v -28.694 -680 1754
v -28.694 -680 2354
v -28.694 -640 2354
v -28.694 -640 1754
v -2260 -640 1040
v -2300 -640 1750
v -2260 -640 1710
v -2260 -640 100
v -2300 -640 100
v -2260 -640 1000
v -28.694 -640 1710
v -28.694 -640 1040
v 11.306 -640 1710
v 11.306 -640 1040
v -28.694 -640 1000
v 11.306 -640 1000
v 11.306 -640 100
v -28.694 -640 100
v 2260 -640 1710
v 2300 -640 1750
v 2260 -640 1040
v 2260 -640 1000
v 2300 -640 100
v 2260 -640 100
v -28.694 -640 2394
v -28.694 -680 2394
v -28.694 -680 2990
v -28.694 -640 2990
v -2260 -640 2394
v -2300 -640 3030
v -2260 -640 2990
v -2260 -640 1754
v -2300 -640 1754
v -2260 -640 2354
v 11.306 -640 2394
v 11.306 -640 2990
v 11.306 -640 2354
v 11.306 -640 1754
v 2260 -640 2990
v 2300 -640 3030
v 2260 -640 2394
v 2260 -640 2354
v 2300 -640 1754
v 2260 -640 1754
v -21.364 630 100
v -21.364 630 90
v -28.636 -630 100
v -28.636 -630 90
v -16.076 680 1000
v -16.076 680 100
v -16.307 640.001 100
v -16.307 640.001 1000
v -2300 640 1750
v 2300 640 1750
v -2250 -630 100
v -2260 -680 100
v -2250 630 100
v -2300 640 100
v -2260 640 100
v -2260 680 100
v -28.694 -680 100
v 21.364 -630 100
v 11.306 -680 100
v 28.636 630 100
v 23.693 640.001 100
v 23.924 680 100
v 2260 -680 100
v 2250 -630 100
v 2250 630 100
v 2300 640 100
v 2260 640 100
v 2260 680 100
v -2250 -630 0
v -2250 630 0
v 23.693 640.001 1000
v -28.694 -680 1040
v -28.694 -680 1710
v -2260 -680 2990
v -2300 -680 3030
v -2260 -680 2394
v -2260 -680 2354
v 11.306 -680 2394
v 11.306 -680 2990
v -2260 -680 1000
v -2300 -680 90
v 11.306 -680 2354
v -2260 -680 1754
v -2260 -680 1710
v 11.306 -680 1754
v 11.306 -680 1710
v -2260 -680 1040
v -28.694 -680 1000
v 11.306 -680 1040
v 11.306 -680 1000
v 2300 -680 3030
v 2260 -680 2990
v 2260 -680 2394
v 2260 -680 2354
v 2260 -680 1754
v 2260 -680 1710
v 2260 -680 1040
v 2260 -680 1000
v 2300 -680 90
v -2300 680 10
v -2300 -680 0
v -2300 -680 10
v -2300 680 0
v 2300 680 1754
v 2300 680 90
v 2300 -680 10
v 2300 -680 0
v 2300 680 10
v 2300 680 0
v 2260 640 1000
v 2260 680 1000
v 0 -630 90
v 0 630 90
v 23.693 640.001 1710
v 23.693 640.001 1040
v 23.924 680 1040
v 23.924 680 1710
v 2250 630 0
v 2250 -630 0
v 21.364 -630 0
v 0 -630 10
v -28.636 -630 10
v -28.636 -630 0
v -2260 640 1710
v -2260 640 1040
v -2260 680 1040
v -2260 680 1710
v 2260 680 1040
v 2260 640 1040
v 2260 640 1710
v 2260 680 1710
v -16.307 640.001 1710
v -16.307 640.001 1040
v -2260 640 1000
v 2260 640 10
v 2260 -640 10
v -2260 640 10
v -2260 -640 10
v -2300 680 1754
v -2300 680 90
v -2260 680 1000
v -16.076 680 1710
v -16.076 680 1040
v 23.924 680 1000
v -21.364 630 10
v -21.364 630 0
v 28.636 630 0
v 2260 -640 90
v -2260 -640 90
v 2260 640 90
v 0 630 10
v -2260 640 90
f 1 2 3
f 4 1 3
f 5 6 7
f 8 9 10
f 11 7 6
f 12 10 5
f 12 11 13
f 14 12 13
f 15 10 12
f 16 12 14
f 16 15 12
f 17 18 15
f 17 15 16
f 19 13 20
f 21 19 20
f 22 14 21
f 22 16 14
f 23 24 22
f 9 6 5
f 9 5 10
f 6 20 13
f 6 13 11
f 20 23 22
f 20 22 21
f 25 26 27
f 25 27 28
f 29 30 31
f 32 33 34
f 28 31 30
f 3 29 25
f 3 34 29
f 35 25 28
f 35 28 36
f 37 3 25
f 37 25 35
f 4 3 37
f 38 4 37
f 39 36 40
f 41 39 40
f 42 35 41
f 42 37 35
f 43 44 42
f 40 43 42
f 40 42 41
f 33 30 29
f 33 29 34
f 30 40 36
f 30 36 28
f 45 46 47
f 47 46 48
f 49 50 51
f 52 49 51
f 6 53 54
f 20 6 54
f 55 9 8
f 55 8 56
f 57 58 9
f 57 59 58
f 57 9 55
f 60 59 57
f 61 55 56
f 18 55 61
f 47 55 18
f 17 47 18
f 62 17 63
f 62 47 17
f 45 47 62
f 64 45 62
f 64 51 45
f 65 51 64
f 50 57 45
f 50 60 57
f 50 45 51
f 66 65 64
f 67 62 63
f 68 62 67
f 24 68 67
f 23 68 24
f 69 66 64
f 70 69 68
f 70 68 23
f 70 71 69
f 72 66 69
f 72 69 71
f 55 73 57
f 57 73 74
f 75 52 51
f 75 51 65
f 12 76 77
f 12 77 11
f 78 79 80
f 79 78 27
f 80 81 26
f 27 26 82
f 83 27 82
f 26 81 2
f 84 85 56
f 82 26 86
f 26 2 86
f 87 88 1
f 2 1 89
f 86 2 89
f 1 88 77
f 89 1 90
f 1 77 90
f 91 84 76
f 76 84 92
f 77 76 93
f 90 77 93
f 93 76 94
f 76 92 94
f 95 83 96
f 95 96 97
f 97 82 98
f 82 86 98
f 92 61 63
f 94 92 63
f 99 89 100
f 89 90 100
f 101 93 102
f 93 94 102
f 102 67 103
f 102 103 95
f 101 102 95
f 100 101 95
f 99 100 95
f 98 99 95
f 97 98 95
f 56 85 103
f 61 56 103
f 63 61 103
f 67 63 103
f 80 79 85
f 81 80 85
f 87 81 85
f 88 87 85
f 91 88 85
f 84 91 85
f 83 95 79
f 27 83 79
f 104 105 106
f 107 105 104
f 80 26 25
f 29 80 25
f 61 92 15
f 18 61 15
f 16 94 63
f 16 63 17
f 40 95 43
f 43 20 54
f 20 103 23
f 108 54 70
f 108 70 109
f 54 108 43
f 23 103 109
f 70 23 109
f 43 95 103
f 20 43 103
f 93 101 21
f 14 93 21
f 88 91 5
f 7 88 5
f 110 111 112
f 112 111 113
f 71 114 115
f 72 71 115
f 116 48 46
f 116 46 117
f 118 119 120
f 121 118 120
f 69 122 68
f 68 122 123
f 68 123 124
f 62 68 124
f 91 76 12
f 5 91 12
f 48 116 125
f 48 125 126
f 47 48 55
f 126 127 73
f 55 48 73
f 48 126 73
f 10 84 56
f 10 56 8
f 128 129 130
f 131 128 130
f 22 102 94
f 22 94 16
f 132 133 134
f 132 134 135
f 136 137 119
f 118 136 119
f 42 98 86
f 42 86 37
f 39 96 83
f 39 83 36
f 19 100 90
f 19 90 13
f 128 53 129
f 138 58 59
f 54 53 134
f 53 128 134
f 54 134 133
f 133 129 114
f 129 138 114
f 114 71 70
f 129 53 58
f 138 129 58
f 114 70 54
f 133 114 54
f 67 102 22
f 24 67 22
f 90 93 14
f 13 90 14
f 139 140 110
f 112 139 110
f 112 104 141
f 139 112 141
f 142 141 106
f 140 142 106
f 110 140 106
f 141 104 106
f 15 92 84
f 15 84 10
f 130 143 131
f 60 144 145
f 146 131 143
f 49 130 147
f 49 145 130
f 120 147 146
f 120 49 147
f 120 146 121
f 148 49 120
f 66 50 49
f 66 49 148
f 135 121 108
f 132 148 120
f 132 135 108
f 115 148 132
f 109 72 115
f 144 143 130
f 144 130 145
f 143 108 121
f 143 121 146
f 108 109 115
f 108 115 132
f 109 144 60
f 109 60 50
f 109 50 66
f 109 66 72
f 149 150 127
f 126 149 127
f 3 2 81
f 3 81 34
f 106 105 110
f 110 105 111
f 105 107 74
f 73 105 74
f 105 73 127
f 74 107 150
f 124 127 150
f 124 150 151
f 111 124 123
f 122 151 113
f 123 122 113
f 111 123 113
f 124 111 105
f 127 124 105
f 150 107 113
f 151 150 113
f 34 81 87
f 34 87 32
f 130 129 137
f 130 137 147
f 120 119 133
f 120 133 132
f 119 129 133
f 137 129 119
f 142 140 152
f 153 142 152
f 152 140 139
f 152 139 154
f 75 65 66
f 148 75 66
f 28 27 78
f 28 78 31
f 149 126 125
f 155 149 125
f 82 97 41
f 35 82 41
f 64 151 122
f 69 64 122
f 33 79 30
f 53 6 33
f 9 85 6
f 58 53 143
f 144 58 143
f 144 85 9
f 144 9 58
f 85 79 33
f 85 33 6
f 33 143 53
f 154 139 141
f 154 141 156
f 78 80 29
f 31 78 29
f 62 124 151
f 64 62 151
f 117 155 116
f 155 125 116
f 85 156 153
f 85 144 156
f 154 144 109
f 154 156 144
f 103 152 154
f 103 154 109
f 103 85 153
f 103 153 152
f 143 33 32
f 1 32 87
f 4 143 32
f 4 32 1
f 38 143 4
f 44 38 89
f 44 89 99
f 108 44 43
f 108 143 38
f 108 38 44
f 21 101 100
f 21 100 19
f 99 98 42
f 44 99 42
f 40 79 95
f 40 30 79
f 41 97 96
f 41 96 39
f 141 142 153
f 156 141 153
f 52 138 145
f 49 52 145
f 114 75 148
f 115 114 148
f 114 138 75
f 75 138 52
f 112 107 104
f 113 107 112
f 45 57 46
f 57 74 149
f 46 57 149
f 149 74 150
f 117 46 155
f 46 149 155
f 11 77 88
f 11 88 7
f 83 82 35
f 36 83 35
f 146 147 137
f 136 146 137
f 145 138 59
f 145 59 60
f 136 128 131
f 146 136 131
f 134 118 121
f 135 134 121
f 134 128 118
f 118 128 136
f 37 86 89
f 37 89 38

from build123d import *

# Parameters (mm, degrees)
F0_W          = 4600
F0_H          = 1360
F1_DEPTH      = 100
F2_W          = 40
F2_H          = 80
F3_DEPTH      = 4600.001
F4_W          = 40
F4_H          = 80
F5_DEPTH      = 1320.001
F7_W          = 90
F7_H          = 80
F8_DEPTH      = 630
F8_DEPTH_BACK = 630
F9_W          = 40
F9_H          = 40
F10_DEPTH     = 2930
F11_W         = 4600
F11_H         = 1360
F12_DEPTH     = 4
F13_DEPTH     = 1650
F14_W         = 40
F14_H         = 40
F15_DEPTH     = 4560


with BuildPart() as f1:
    # F0 (on Top) → F1 (new body)
    with BuildSketch(Plane.XY):
        Rectangle(F0_W, F0_H)
        Polygon((-2250, -630), (-2250, 630), (-21.3644690673, 630), (-28.6363636364, -630), align=None, mode=Mode.SUBTRACT)
        Polygon((28.6363636364, 630), (2250, 630), (2250, -630), (21.3644690673, -630), align=None, mode=Mode.SUBTRACT)
    extrude(amount=F1_DEPTH)

    # F2 (on face) → F3 (cut, through all)
    with BuildSketch(Plane(origin=(-2300, 0, 0), x_dir=(0, -1, 0), z_dir=(-1, 0, 0))):
        with Locations((-660, 50)):
            Rectangle(F2_W, F2_H)
        with Locations((660, 50)):
            Rectangle(F2_W, F2_H)
    extrude(amount=-F3_DEPTH, mode=Mode.SUBTRACT)

    # F4 (on face) → F5 (cut, through all)
    with BuildSketch(Plane.XZ.offset(640)):
        with Locations((2280, 50)):
            Rectangle(F4_W, F4_H)
        with Locations((-2280, 50)):
            Rectangle(F4_W, F4_H)
    extrude(amount=-F5_DEPTH, mode=Mode.SUBTRACT)

    # F7 (on Front) → F8 (cut, two sides)
    with BuildSketch(Plane.XZ) as f8_sk:
        with Locations((-45, 50)):
            Rectangle(F7_W, F7_H)
    extrude(amount=-F8_DEPTH, mode=Mode.SUBTRACT)
    extrude(f8_sk.sketch, amount=F8_DEPTH_BACK, mode=Mode.SUBTRACT)

    # F9 (on face) → F10 (join)
    with BuildSketch(Plane.XY.offset(100)):
        with Locations((-2280, -660)):
            Rectangle(F9_W, F9_H)
        with Locations((2280, -660)):
            Rectangle(F9_W, F9_H)
        with Locations((-8.6940770853, -660)):
            Rectangle(F9_W, F9_H)
    extrude(amount=F10_DEPTH)

    # F11 (on offset) → F12 (join)
    with BuildSketch(Plane.XY.offset(1750)):
        Rectangle(F11_W, F11_H)
    extrude(amount=F12_DEPTH)

    # F9 (on face) → F13 (join)
    with BuildSketch(Plane.XY.offset(100)):
        with Locations((-2280, 660)):
            Rectangle(F9_W, F9_H)
        with Locations((2280, 660)):
            Rectangle(F9_W, F9_H)
        Polygon((23.9241814479, 680), (-16.0758185521, 680), (-16.3066685033, 640.0006661518), (23.6933314967, 640.0006661518), align=None)
        with Locations((-2280, -660)):
            Rectangle(F9_W, F9_H)
        with Locations((-8.6940770853, -660)):
            Rectangle(F9_W, F9_H)
        with Locations((2280, -660)):
            Rectangle(F9_W, F9_H)
    extrude(amount=F13_DEPTH)

    # F14 (on face) → F15 (join, through all)
    with BuildSketch(Plane.YZ.offset(2300)):
        with Locations((-660, 3010)):
            Rectangle(F14_W, F14_H)
        with Locations((660, 1020)):
            Rectangle(F14_W, F14_H)
        with Locations((-660, 1020)):
            Rectangle(F14_W, F14_H)
        with Locations((-660, 2374)):
            Rectangle(F14_W, F14_H)
        with Locations((-660, 1730)):
            Rectangle(F14_W, F14_H)
        with Locations((660, 1730)):
            Rectangle(F14_W, F14_H)
    extrude(amount=-F15_DEPTH)


solid = f1.part
